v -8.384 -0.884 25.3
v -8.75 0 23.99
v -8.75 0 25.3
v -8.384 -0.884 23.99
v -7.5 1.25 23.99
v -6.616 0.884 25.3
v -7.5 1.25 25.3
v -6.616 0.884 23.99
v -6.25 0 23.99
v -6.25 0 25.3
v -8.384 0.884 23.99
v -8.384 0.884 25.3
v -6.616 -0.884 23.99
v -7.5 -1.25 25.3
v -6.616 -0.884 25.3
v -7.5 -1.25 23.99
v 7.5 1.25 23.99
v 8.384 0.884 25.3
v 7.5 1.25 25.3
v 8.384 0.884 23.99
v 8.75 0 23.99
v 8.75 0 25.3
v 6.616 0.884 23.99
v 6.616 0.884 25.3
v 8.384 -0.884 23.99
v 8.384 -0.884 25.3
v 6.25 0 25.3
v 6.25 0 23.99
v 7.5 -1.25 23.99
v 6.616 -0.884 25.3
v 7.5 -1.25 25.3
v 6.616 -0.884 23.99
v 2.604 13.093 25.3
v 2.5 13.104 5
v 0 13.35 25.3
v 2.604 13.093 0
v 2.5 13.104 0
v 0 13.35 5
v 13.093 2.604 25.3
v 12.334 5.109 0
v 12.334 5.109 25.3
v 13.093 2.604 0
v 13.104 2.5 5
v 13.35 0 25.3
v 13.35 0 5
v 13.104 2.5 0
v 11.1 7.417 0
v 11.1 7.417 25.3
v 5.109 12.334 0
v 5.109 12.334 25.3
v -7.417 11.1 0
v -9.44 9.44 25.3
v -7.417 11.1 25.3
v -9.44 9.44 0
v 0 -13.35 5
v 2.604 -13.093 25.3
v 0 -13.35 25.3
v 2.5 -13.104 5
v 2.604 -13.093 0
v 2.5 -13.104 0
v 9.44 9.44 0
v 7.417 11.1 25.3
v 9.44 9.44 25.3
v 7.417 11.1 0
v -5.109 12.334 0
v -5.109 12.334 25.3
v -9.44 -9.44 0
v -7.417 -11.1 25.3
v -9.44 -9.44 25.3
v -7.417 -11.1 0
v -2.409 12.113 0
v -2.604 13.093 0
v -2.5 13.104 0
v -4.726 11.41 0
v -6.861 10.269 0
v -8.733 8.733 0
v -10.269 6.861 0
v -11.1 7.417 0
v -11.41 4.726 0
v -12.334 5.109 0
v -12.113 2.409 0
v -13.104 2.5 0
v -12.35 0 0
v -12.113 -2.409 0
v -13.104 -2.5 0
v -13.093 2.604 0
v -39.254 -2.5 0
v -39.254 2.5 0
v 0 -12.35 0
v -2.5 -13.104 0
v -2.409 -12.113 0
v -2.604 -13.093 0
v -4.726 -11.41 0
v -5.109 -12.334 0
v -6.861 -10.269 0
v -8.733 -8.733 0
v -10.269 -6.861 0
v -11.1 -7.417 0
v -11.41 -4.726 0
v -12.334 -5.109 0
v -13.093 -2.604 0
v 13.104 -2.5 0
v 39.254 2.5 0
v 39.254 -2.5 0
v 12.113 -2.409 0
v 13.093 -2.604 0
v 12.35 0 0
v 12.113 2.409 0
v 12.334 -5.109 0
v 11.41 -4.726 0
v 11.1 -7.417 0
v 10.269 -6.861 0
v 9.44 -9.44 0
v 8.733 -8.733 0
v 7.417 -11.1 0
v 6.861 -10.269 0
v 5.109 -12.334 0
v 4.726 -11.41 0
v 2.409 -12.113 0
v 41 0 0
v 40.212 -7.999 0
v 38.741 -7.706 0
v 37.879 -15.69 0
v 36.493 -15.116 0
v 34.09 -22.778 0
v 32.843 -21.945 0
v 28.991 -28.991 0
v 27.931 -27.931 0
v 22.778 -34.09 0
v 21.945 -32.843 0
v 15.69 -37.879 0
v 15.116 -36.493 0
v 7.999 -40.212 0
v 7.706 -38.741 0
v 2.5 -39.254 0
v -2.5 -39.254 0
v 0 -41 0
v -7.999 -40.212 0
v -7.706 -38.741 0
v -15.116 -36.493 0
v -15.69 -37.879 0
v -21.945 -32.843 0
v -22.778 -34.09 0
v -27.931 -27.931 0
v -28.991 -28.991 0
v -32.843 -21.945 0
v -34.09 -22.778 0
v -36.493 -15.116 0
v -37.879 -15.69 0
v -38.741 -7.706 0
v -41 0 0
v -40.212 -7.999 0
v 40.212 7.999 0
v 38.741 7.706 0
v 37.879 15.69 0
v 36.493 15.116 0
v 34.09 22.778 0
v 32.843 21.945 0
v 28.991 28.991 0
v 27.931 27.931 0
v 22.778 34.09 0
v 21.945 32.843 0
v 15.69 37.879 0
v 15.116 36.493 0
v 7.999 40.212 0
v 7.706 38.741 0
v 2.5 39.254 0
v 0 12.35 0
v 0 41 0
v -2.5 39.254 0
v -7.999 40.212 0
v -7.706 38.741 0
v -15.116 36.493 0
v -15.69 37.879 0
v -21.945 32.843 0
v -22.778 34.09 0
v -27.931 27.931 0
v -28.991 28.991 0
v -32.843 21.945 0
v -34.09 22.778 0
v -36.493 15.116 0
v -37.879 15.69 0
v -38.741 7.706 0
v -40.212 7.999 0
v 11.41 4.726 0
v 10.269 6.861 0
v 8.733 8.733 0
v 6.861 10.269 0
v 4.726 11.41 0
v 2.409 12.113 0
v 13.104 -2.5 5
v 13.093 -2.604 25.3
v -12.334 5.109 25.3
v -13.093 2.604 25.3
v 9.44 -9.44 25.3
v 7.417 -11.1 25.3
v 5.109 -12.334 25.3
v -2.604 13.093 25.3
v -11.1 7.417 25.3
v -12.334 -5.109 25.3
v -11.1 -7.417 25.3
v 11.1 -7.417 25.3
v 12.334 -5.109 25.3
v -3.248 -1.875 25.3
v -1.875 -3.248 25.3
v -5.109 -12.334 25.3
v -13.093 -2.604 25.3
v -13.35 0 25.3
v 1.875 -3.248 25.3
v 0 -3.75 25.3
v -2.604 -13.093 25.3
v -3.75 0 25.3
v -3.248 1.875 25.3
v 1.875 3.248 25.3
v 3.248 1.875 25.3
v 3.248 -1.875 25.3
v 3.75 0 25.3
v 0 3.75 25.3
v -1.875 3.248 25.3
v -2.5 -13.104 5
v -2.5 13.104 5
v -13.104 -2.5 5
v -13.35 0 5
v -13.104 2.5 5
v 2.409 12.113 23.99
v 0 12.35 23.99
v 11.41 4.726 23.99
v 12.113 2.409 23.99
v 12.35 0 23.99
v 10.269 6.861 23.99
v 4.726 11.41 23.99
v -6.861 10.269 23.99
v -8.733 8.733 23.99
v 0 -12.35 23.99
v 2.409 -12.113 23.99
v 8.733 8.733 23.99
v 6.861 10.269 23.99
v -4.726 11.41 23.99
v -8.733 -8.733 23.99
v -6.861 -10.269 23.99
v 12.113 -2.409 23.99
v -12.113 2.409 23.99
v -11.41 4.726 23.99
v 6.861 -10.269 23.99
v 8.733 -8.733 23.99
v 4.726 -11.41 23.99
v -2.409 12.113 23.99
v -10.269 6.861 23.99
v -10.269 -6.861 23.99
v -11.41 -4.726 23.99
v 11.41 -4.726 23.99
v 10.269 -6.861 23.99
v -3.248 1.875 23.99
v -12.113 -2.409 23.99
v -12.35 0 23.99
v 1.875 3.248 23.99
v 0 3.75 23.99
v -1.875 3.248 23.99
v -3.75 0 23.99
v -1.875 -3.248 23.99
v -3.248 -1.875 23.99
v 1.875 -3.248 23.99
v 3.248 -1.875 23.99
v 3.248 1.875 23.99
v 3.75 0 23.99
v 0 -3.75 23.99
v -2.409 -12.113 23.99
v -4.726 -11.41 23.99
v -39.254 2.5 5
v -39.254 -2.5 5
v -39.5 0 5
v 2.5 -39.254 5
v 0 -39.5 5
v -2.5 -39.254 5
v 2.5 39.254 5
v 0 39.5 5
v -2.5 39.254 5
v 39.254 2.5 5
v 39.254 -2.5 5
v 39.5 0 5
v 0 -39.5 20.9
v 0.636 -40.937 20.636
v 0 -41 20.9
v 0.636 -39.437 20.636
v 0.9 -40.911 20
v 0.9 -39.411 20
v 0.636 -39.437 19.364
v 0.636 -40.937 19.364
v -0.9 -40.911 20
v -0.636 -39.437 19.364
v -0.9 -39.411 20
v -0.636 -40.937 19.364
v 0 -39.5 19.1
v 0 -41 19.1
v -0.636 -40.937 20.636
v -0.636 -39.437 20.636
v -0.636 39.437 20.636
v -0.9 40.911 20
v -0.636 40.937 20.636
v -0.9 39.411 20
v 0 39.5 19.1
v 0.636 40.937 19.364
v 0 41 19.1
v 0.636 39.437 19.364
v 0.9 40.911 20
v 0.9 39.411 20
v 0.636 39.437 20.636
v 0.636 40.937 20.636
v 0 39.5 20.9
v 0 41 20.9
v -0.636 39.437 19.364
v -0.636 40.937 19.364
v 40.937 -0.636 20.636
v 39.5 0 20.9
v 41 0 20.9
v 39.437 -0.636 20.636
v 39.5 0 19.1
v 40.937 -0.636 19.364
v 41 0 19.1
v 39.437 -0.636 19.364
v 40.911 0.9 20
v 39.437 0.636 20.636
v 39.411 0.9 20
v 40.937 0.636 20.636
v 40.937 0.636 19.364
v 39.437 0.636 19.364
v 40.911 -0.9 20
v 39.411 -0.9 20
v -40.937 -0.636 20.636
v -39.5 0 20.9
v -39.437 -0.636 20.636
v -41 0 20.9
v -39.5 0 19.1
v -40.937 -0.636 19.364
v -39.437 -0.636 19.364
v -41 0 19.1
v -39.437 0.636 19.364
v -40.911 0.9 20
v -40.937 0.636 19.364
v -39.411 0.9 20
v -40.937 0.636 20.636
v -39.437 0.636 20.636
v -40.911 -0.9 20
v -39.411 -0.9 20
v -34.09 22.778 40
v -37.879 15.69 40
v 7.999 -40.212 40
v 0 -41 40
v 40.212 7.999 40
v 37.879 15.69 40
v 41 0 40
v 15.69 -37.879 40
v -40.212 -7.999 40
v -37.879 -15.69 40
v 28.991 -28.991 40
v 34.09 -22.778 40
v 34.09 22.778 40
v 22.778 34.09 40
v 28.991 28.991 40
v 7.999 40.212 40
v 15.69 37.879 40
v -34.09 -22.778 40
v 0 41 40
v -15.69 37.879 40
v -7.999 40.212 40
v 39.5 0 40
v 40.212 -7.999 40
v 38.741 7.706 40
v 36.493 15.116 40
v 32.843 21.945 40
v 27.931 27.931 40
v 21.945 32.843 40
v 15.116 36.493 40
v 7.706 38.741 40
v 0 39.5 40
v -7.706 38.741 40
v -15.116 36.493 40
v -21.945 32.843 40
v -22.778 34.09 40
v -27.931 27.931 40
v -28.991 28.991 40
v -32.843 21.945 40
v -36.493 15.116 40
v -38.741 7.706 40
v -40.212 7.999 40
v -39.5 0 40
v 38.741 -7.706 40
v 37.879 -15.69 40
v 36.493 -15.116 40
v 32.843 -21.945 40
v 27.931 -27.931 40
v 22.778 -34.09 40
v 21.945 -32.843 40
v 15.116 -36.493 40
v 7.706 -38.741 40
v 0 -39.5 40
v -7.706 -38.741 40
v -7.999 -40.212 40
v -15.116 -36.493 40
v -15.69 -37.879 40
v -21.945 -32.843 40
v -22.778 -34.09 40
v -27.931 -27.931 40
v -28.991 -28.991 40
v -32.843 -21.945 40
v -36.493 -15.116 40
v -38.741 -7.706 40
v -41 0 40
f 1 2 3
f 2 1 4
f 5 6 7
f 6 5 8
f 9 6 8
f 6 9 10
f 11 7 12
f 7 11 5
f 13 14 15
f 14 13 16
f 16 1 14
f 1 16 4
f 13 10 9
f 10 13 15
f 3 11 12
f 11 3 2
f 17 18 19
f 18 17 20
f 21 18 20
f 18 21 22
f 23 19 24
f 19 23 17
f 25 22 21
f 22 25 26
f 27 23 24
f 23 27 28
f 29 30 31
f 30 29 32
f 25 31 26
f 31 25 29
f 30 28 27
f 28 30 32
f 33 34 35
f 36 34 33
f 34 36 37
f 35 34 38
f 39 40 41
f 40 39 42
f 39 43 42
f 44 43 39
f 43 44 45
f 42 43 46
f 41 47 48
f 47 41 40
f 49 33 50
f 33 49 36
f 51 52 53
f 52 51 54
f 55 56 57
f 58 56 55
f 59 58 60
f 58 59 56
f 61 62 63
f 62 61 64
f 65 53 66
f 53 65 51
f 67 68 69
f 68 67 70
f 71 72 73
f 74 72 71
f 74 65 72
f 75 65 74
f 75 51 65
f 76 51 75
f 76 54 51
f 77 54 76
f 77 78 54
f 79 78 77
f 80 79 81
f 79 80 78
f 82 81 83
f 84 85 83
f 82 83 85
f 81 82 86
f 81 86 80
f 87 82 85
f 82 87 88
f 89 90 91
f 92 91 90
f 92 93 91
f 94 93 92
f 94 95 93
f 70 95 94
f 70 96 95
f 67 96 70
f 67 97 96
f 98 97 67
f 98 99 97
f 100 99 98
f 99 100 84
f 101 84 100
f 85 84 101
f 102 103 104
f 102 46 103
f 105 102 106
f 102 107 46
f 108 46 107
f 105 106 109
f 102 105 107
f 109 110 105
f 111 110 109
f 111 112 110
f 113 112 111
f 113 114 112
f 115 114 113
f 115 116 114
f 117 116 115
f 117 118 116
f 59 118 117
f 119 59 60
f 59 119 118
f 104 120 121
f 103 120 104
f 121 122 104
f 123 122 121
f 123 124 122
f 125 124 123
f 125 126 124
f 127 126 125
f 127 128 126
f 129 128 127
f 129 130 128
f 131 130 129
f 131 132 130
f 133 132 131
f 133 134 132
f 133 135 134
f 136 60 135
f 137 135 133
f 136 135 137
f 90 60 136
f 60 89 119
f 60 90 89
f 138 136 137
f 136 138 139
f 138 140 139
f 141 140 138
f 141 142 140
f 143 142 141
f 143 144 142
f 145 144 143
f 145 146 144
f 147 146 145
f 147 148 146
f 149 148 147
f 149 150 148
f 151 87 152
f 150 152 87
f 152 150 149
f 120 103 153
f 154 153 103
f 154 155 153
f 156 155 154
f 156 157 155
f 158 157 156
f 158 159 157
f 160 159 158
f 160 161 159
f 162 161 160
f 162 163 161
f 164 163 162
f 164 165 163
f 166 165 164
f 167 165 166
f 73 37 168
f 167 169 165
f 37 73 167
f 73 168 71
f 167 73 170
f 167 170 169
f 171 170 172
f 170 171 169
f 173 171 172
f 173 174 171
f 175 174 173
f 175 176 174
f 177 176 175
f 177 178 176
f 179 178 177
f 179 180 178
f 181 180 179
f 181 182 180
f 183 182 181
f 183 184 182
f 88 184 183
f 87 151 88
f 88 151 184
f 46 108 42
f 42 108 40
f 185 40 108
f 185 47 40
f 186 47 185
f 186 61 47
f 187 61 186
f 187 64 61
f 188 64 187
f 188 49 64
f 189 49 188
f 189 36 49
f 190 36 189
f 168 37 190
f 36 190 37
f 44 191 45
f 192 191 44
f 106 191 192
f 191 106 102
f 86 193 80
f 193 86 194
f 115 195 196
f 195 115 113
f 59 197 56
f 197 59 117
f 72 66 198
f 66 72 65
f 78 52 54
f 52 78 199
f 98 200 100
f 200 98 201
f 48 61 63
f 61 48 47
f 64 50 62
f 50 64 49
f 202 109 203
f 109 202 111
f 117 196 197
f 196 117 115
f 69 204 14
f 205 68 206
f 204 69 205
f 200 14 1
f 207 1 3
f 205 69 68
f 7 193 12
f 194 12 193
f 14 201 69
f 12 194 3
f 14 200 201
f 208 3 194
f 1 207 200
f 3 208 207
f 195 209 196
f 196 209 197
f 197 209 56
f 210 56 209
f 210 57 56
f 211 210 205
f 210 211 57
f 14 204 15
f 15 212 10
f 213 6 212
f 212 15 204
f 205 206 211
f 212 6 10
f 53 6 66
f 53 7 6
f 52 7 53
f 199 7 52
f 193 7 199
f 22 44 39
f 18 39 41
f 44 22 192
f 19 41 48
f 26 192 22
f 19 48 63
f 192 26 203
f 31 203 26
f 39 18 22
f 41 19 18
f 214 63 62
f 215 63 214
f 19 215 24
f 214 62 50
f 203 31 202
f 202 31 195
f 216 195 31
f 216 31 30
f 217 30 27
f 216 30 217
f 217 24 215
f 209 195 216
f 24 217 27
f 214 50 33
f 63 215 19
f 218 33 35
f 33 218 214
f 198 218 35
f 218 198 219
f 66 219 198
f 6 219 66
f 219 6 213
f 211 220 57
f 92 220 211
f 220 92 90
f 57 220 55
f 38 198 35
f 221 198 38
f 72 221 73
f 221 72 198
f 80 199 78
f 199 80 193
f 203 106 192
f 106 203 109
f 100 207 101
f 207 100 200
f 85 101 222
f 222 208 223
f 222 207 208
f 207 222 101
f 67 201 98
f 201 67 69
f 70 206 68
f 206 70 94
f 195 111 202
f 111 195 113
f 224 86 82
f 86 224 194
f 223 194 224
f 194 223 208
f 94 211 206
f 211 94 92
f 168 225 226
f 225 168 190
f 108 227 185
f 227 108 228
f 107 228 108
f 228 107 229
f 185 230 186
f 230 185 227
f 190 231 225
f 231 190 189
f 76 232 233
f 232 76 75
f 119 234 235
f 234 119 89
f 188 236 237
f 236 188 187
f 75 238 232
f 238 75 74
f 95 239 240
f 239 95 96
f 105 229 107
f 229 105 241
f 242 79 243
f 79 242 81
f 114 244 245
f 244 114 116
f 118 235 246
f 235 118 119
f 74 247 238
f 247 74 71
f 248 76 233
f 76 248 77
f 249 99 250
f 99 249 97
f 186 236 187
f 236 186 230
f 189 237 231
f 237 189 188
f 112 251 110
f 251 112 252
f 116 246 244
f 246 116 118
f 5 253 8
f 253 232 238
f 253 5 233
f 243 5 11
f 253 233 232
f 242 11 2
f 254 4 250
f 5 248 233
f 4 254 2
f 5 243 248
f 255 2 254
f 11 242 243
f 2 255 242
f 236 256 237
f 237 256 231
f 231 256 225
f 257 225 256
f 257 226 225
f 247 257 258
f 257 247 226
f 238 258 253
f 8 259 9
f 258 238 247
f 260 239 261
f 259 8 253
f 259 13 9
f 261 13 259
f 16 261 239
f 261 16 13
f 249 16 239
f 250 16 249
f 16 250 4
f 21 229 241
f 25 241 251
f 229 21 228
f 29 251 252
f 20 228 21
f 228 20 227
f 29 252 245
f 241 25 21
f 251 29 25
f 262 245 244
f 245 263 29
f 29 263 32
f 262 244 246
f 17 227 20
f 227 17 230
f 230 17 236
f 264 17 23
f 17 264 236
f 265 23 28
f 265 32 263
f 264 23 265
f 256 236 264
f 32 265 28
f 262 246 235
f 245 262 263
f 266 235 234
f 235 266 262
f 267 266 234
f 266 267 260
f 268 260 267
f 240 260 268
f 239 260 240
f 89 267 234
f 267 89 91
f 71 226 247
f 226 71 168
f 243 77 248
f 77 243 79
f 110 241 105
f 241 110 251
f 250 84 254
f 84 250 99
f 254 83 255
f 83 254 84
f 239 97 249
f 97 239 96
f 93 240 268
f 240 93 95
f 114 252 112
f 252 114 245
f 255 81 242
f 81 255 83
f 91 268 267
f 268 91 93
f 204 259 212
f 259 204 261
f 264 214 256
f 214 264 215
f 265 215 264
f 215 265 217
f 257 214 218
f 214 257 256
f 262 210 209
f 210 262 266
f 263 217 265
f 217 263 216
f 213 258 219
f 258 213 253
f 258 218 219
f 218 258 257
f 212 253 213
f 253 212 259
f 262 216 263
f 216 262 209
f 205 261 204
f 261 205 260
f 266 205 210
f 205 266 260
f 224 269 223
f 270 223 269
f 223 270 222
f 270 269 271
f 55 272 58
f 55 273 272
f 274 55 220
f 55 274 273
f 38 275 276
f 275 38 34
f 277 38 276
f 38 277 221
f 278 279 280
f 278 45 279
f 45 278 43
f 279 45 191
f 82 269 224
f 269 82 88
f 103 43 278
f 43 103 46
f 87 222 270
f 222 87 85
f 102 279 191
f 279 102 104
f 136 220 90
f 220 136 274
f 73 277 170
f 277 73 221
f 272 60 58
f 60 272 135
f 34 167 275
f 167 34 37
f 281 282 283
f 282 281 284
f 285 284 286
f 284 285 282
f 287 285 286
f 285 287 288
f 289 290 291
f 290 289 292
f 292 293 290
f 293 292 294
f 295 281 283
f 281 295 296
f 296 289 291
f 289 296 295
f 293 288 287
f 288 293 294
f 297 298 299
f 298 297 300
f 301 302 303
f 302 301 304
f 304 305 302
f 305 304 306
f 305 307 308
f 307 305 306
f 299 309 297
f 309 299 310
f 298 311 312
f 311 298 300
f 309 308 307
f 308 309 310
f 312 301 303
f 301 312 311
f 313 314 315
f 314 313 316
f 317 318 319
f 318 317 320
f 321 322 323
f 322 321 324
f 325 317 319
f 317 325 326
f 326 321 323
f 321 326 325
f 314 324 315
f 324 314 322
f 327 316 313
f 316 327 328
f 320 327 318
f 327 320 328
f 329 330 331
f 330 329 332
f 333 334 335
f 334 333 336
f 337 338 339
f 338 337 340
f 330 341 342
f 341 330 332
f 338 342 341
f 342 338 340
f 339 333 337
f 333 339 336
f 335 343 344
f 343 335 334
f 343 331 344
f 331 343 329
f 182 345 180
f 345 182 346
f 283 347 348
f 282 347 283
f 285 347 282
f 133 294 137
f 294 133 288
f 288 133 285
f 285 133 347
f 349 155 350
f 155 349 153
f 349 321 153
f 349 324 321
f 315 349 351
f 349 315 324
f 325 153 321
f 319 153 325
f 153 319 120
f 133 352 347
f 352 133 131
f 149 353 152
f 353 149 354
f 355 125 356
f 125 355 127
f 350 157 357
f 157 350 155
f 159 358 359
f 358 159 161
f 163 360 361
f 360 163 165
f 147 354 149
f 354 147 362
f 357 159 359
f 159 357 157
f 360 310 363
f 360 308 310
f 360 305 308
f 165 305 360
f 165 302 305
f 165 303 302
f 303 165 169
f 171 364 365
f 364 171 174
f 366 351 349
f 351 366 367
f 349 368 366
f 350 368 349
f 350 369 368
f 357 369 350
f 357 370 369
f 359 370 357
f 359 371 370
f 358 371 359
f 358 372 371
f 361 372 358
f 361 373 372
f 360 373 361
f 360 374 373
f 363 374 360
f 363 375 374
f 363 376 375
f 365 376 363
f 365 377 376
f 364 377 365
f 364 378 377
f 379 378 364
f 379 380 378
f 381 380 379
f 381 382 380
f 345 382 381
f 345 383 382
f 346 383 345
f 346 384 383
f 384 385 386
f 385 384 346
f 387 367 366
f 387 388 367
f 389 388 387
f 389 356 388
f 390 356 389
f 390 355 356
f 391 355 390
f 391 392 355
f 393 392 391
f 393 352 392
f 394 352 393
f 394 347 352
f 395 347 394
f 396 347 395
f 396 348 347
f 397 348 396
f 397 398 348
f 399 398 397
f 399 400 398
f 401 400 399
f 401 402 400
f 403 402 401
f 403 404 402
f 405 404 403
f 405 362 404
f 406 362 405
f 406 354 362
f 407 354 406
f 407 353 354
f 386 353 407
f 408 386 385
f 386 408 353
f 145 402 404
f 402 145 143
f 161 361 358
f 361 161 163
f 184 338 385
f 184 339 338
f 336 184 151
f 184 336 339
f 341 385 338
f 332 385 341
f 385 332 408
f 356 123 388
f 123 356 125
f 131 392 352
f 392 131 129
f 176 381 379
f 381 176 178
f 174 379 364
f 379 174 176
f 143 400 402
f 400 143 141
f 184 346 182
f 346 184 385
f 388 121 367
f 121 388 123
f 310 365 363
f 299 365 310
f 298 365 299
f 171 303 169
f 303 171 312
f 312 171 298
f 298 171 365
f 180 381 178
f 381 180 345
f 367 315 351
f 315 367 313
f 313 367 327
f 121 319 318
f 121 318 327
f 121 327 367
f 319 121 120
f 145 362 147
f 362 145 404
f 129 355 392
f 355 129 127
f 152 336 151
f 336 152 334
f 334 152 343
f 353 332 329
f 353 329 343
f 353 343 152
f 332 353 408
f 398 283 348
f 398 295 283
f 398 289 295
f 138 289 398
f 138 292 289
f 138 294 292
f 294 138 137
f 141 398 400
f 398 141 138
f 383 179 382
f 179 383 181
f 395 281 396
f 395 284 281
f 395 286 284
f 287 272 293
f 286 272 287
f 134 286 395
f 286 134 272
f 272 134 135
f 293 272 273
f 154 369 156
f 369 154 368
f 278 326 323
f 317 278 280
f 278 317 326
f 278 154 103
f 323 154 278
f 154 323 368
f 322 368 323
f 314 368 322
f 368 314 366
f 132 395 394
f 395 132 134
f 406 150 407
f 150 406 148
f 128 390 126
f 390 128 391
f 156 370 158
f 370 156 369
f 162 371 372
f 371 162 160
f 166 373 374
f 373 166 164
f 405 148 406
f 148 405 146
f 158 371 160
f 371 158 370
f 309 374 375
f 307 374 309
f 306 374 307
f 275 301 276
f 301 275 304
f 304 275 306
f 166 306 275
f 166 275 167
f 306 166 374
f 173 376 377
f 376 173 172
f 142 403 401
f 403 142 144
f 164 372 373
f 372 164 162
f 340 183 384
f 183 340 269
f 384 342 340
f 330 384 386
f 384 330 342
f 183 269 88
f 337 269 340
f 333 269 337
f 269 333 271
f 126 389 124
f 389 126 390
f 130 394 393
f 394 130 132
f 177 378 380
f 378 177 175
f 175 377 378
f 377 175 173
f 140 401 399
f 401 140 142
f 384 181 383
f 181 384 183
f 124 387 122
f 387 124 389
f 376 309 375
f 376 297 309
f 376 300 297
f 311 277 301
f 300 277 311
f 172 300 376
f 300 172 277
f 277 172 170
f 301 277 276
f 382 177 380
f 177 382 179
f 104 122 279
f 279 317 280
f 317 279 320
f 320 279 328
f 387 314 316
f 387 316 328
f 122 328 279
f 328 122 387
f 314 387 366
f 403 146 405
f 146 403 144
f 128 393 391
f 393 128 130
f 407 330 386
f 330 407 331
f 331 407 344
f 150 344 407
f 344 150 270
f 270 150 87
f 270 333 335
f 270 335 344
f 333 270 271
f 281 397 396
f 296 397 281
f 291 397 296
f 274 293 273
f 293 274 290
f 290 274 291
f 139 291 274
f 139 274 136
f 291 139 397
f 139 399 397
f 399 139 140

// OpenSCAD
width = 84;
height = 40;

motor_diameter = 24.2+0.5;

// motor base
difference(){
    cylinder(d=motor_diameter+2,h=24+1.3,$fn=32);

    translate([0,0,-0.01]){
        cylinder(d=motor_diameter,h=24,$fn=32);
    }
    translate([0,0,22]){
        cylinder(d=7.5,h=5,$fn=12);
    }
    for(x=[-7.5,7.5]){
        translate([x,0,22]){
            cylinder(d=2.5,h=5,$fn=8);
        }
    }
}

// connectors
difference(){
    translate([0,0,2.5]){
        for(z=[0,90]){
            rotate([0,0,z]){
                cube([81,5,5], center=true);
            }                
        }
    }

    translate([0,0,-0.01]){
        cylinder(d=motor_diameter,h=24,$fn=32);
    }
}

// flow guide
union(){
    difference(){
        cylinder(d=82,h=height,$fn=32);
        cylinder(d=79,h=100,$fn=32,center=true);
        
        // anchor
        translate([0,0,height/2]){
            rotate([90,0,0]){
                translate([0,0,39]){
                    cylinder(h=4,d=1.8,$fn=8);
                }
            }
            rotate([-90,0,0]){
                translate([0,0,39]){
                    cylinder(h=4,d=1.8,$fn=8);
                }
            }
            rotate([0,90,0]){
                translate([0,0,39]){
                    cylinder(h=4,d=1.8,$fn=8);
                }
            }
            rotate([0,-90,0]){
                translate([0,0,39]){
                    cylinder(h=4,d=1.8,$fn=8);
                }
            }
        }
    }
}
